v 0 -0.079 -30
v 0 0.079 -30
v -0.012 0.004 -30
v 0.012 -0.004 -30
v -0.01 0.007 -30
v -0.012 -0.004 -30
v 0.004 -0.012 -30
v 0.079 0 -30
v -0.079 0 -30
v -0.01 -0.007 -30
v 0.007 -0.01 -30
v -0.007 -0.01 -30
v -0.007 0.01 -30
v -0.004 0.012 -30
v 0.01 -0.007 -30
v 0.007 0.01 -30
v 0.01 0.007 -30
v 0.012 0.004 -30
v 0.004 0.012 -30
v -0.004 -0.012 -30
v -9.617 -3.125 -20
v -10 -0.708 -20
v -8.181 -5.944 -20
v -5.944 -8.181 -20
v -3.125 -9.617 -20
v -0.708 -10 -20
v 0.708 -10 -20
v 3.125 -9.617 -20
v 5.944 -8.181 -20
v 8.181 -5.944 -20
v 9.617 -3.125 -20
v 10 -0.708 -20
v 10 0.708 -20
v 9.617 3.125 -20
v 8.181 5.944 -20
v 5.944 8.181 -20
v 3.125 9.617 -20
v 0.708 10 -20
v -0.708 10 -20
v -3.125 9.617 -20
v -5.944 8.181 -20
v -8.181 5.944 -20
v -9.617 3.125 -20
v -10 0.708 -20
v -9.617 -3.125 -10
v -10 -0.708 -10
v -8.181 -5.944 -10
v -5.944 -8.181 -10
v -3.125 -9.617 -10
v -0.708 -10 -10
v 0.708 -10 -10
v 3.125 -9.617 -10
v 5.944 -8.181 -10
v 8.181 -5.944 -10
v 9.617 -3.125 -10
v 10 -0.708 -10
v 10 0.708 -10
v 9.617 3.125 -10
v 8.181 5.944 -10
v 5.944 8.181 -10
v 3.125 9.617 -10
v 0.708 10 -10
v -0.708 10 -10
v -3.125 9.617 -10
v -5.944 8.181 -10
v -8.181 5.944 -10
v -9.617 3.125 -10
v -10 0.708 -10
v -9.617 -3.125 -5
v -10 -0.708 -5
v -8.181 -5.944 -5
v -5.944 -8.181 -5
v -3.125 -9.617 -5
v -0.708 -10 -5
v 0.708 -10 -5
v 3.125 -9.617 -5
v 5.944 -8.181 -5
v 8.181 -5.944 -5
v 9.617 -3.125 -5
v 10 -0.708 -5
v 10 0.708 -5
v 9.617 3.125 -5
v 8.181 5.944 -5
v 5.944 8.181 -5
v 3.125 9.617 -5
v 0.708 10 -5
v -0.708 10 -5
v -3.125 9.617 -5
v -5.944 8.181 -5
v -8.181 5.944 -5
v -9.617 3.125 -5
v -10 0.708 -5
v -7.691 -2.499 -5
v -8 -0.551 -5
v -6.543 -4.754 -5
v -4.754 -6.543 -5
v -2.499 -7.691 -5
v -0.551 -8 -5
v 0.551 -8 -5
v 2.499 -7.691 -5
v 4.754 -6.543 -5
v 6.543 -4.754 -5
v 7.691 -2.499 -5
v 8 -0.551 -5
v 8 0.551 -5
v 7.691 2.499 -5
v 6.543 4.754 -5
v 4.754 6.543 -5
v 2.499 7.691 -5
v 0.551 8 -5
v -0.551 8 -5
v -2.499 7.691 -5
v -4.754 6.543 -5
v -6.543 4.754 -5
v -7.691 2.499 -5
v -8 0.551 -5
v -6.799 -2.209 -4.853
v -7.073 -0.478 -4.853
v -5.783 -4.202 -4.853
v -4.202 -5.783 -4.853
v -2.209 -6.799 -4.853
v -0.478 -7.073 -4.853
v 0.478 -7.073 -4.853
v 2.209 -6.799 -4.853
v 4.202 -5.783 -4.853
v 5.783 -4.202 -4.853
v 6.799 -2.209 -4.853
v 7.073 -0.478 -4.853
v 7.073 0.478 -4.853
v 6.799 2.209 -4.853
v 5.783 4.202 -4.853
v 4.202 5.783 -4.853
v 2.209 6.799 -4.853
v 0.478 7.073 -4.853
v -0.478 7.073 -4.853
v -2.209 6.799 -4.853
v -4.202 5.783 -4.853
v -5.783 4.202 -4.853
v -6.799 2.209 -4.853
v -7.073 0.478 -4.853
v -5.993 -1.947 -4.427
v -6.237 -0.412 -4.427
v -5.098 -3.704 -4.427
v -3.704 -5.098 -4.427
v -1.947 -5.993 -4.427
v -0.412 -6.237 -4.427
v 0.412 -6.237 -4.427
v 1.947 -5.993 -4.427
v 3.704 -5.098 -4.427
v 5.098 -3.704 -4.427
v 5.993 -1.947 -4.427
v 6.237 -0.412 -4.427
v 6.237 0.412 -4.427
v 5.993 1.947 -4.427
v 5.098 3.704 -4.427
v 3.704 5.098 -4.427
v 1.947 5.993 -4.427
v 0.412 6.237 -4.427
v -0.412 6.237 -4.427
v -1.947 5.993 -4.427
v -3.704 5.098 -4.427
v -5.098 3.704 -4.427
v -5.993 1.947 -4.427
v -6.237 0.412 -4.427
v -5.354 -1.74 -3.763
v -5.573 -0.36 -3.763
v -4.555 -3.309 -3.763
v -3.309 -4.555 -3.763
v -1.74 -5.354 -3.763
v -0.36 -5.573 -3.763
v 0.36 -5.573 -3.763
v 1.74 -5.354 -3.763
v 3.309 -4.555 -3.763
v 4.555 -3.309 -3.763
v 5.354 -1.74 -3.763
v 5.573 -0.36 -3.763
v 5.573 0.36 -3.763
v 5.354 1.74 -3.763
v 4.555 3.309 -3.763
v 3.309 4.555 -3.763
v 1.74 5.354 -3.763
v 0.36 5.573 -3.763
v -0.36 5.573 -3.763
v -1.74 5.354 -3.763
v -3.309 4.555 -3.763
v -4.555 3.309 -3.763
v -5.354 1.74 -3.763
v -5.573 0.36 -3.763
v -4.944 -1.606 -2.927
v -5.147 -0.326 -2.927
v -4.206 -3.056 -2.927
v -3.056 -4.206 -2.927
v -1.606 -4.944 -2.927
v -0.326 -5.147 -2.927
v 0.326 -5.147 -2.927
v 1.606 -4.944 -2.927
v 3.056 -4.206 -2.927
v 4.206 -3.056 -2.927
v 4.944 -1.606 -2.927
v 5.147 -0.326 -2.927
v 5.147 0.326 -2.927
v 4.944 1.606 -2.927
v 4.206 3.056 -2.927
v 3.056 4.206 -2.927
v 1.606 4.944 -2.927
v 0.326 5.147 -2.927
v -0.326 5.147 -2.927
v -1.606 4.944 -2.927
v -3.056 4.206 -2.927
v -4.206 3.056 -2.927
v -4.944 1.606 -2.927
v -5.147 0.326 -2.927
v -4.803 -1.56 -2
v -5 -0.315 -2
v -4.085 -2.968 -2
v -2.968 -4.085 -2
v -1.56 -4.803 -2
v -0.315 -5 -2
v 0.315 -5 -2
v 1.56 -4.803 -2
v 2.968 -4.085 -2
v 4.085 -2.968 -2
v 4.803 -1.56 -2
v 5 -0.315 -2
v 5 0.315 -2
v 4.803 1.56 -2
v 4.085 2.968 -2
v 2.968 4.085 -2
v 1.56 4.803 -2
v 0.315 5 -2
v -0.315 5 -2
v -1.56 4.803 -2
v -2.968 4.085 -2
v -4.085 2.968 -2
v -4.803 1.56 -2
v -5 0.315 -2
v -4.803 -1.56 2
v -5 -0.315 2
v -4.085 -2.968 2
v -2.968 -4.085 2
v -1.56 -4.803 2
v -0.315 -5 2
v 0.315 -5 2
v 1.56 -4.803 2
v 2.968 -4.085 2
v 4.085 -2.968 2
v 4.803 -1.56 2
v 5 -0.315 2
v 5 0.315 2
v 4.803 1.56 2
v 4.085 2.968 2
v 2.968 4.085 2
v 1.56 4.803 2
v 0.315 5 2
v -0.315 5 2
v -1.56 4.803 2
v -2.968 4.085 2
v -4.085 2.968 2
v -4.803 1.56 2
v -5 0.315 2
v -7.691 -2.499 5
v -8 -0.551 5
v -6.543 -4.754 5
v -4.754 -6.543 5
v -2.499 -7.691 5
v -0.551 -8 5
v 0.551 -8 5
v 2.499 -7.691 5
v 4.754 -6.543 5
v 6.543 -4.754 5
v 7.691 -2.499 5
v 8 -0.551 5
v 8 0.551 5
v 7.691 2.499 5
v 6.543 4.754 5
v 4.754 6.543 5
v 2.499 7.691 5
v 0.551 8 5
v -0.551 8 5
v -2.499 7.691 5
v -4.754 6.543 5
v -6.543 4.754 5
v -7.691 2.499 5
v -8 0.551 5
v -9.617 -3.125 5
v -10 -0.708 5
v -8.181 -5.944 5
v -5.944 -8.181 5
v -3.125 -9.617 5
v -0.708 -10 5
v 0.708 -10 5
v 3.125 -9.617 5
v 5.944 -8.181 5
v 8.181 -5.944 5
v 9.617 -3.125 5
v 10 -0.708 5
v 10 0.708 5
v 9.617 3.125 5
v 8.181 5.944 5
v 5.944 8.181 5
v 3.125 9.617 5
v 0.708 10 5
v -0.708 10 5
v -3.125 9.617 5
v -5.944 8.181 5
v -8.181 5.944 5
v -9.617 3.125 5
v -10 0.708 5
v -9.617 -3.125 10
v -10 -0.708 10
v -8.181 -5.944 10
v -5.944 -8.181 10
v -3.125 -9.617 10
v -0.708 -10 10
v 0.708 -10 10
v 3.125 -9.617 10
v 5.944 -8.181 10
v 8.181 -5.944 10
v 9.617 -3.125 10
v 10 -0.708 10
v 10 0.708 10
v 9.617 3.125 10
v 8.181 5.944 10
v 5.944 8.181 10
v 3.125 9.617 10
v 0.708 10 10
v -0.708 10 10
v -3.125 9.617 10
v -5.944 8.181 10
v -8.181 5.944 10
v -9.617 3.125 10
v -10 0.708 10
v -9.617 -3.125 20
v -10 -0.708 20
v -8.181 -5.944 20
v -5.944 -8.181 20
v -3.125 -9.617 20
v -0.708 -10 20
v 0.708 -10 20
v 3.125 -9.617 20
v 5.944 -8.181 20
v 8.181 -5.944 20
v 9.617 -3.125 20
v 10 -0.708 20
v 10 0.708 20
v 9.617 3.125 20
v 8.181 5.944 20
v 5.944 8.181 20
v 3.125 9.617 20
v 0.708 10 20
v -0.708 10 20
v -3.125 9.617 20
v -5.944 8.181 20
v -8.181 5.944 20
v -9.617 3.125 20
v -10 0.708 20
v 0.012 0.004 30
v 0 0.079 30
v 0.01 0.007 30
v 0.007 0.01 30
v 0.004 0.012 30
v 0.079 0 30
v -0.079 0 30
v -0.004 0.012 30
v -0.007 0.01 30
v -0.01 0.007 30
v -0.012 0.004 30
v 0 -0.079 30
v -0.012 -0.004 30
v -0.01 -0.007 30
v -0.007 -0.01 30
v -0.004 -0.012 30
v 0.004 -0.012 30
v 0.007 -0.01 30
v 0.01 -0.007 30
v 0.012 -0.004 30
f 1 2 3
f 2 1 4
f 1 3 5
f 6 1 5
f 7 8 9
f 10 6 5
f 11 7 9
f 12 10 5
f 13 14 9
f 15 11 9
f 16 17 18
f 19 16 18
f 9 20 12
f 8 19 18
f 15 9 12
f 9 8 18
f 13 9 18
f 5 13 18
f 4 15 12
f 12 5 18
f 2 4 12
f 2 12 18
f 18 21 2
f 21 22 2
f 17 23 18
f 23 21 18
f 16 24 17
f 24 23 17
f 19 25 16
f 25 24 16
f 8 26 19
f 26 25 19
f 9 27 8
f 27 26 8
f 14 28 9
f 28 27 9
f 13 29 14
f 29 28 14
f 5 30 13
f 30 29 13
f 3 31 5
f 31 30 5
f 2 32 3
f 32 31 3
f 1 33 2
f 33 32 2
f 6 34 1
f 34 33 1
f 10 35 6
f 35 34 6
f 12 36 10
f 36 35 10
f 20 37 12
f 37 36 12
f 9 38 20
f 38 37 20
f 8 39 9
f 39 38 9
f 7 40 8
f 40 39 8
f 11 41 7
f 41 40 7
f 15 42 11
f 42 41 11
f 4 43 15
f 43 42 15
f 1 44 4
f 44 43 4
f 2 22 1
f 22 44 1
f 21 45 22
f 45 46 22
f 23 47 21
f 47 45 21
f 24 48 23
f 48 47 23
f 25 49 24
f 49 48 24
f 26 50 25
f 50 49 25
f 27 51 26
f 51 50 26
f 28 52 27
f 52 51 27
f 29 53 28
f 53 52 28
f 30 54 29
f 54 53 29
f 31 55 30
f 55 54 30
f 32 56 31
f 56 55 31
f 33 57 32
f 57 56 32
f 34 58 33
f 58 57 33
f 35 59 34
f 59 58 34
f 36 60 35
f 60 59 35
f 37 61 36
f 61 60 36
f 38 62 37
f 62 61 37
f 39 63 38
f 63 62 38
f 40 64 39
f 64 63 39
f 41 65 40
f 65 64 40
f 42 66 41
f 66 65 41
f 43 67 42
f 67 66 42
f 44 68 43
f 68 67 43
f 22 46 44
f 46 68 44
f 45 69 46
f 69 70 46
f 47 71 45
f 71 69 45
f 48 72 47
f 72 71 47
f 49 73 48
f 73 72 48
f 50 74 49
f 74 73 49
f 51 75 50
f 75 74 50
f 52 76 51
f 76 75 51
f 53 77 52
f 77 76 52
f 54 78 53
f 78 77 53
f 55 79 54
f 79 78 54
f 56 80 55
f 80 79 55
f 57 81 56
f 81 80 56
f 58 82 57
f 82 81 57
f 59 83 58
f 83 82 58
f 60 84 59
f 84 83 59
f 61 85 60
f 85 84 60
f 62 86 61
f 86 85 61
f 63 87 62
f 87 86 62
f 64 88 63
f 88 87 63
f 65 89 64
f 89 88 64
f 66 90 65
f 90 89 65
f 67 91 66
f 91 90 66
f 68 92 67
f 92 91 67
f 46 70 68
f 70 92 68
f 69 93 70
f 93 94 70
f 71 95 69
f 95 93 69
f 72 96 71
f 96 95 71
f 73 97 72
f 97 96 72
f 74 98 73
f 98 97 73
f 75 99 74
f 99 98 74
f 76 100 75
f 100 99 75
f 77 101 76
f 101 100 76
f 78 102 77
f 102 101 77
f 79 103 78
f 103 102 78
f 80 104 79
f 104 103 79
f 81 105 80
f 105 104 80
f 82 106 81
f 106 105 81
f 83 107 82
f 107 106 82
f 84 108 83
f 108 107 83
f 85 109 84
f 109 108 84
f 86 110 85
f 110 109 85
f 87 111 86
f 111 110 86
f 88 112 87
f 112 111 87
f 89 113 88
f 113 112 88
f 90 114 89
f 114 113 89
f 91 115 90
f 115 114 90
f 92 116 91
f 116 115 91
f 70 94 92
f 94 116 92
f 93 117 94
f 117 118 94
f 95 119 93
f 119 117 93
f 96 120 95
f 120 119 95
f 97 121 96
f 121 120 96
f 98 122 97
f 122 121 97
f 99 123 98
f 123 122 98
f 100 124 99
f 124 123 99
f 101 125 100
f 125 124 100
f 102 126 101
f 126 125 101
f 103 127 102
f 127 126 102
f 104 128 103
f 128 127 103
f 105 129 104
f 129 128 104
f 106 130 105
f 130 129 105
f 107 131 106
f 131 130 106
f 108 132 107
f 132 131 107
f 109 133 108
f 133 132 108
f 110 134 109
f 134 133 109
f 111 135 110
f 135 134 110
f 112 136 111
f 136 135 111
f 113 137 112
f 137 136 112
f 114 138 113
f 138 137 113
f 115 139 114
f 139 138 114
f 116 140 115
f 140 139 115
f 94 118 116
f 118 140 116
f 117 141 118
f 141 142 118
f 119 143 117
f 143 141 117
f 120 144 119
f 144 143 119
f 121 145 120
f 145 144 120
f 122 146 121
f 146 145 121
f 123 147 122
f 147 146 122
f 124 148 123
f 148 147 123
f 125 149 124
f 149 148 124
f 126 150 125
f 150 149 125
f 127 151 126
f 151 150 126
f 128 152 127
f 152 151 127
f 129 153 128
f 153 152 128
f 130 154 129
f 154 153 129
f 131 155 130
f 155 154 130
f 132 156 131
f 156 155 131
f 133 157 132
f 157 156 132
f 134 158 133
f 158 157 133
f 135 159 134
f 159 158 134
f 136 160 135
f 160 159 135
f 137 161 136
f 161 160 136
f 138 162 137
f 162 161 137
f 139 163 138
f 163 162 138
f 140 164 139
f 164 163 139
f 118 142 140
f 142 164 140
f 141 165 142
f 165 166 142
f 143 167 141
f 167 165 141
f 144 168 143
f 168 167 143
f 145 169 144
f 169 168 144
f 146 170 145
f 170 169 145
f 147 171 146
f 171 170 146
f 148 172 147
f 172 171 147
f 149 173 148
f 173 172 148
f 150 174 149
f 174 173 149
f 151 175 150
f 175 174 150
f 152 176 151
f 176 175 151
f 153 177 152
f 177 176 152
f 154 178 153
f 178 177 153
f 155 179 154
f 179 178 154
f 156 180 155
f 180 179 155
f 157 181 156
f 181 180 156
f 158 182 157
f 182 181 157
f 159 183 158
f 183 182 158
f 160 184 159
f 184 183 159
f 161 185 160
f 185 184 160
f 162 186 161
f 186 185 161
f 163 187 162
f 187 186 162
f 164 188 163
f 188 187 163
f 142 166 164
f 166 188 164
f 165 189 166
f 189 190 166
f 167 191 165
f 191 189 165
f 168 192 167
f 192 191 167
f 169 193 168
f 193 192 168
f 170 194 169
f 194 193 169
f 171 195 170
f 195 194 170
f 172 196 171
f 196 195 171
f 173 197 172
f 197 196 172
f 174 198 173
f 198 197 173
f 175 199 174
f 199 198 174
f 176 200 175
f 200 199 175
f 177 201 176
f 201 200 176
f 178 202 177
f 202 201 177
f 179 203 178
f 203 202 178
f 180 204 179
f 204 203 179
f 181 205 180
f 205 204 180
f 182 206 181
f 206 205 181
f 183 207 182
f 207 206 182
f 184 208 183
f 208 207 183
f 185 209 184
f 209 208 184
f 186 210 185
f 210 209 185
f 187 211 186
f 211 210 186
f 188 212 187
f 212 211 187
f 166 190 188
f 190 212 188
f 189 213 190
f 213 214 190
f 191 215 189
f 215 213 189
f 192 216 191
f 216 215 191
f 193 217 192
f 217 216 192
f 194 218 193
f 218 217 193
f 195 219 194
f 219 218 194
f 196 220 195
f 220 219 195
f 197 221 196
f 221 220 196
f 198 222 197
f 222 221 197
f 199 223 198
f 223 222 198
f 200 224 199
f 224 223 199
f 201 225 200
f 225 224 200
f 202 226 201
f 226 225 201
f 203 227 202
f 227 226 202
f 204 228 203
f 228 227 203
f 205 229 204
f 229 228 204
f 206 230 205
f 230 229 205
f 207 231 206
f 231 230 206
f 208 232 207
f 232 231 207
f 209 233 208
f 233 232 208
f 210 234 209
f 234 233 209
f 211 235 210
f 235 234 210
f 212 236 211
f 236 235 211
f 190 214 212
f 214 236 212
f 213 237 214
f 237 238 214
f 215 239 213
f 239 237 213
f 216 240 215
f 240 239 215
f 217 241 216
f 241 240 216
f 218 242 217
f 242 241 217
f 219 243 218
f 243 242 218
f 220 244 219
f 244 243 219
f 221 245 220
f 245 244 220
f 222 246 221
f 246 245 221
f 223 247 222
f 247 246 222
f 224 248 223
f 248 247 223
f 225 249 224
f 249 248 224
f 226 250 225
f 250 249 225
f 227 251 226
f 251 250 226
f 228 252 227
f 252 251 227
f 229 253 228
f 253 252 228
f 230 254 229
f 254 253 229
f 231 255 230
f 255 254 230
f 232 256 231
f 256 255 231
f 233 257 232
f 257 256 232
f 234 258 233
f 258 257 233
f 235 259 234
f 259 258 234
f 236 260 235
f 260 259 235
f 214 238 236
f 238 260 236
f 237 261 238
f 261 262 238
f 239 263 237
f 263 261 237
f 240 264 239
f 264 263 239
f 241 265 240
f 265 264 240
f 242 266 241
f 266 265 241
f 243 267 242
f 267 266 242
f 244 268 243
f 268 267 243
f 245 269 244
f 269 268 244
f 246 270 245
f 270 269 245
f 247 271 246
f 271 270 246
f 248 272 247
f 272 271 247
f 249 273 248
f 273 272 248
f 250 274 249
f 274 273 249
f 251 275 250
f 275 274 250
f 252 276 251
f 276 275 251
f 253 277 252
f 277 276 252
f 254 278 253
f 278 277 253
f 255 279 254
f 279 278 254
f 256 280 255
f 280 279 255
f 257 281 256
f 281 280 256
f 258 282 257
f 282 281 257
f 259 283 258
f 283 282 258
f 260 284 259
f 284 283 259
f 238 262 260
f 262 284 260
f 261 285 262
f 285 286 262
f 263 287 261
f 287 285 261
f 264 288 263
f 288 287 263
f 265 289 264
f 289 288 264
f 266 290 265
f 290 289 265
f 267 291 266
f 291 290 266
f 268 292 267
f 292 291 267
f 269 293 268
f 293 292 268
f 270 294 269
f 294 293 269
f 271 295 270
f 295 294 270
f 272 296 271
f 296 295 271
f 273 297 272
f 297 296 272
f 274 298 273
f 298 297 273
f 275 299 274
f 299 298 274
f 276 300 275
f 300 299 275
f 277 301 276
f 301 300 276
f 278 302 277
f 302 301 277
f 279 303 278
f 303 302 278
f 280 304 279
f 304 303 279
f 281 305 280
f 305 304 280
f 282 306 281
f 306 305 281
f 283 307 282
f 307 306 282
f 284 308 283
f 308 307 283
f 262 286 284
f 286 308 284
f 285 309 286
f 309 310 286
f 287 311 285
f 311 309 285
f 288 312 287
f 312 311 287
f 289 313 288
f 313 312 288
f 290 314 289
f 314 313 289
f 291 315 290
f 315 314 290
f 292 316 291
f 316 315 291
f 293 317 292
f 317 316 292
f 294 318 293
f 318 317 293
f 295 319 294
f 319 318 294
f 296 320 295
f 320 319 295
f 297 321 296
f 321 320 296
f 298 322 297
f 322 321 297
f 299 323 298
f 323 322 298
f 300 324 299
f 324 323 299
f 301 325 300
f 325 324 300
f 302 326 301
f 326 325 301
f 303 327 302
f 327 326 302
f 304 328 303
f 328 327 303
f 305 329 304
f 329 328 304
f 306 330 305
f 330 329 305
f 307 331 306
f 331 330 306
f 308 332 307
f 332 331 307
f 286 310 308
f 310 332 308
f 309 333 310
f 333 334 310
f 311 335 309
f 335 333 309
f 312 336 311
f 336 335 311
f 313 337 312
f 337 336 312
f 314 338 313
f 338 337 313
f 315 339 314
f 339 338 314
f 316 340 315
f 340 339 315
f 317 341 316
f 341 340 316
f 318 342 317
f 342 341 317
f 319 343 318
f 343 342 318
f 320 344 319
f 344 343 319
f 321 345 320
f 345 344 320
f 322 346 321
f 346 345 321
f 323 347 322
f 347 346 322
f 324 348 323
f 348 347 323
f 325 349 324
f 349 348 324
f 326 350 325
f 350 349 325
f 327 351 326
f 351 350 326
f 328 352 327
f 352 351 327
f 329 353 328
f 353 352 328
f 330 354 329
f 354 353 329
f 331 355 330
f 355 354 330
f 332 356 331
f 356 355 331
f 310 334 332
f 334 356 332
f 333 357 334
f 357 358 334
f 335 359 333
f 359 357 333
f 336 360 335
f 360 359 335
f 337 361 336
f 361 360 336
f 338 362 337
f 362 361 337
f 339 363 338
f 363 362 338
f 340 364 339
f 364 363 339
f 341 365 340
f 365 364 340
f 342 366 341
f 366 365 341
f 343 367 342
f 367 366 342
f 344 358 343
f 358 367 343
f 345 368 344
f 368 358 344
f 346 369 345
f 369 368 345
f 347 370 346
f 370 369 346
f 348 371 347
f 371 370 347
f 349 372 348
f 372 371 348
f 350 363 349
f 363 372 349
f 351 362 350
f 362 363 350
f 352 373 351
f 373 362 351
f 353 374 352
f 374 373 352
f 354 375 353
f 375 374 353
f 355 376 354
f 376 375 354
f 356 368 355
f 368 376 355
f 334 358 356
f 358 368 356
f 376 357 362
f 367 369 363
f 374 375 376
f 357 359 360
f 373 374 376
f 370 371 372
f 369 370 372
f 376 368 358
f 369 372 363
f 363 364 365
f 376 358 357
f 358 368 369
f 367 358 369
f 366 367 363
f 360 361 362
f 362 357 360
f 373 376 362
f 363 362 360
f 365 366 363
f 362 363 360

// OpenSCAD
// file: ../lib/TOGComplexLib1.scad
function tcplx1_multiply(a, b) =
	[a[0]*b[0] - a[1]*b[1], a[0]*b[1] + a[1]*b[0]];
function tcplx1_divide(a, b) =
	let(bot = (b[0]*b[0] + b[1]*b[1]))
	[
		(a[0]*b[0] + a[1]*b[1])/bot,
		(a[1]*b[0] - a[0]*b[1])/bot
	];

assert([-11,23] == tcplx1_multiply([3,2], [1,7]));

assert([-1,3] == tcplx1_multiply([3,1], [0,1]));
assert([-1,3] == tcplx1_multiply([0,1], [3,1]));

echo(tcplx1_divide([-1,3], [3,1]));
assert([0,1] == tcplx1_divide([-1,3], [3,1]));

function tcplx1_normalize(vec) =
	let(veclen = sqrt(vec[0]*vec[0]+vec[1]*vec[1]))
	[vec[0] / veclen, vec[1] / veclen];

function tcplx1_relative_turnvec_vv(v0, v1) =
	tcplx1_divide(tcplx1_normalize(v1), tcplx1_normalize(v0));

function tcplx1_relative_turnvec_abc(p0, p1, p2) = tcplx1_relative_turnvec_vv(p1-p0, p2-p1);

// A 90-degree turn
assert([0,1] == tcplx1_relative_turnvec_abc([0,0], [1,0], [1,1]));
assert([0,1] == tcplx1_relative_turnvec_abc([0,0], [0,1], [-1,1]));

// A 45-degree turn
assert(tcplx1_normalize([1,1]) == tcplx1_relative_turnvec_abc([0,0], [1,0], [ 2,1]));
assert(tcplx1_normalize([1,1]) == tcplx1_relative_turnvec_abc([0,0], [0,1], [-1,2]));


function tcplx1_relative_angle_abc(p0, p1, p2) =
	let(turnvec = tcplx1_relative_turnvec_abc(p0, p1, p2))
	atan2(turnvec[1], turnvec[0]);

assert(-135 == tcplx1_relative_angle_abc([0,0], [1,0], [0,-1]));
assert( -90 == tcplx1_relative_angle_abc([0,0], [1,0], [1,-1]));
assert(   0 == tcplx1_relative_angle_abc([0,0], [1,0], [2, 0]));
assert(  90 == tcplx1_relative_angle_abc([0,0], [1,0], [1, 1]));
assert( 135 == tcplx1_relative_angle_abc([0,0], [1,0], [0, 1]));

assert(  90 == tcplx1_relative_angle_abc([1,1], [3,3], [1, 5]));
// file: ../lib/TOGArrayLib1.scad
// TOGArrayLib1.5
// 
// Functions for working with arrays.
// 
// v1.1:
// - tal1_reduce assert(is_list(items)) to prevent infinite recursion
//   when given undefined or other non-list values
// v1.1.1:
// - Fix tal1_uniq_remap_v2 to return "list-remap-result" as the
//   first element of the returned list
// v1.2:
// - Add tal1_replace_at function
// v1.3:
// - tal1_is_vec_of, tal1_is_vec_of_num
// v1.4:
// - tal1_assert_for_each, for when you want to assert something
//   about each of a list of items and get nice failure messages
// v1.5:
// - Add tal1_duplicate_reversed function, which may be
//   handy when generating symmetrical polygons and stuff.

/**
 * Make a list with the contents of list `a`,
 * but starting at offset `off`, replaced by the contents of list `b`.
 * len(result) = max(len(a), off+len(b))
 */
function tal1_replace_at(a, off, b, default_value=undef, default_value_function=undef) =
	assert(is_list(a))
	assert(is_list(b))
	let( _dvf = !is_undef(default_value_function) ? default_value_function : function(i) default_value )
[
	for( i=[0:1:min(off,len(a))-1] ) a[i],
	for( i=[len(a):1:off-1] ) _dvf(i),
	for( i=[off:1:off+len(b)-1] ) b[i-off],
	for( i=[off+len(b):1:len(a)-1] ) a[i],
];

// Simplest case
assert([] == tal1_replace_at([], 0, []));
// Second simplest cases
assert(["foo"] == tal1_replace_at(["foo"], 0, []));
assert(["foo"] == tal1_replace_at([], 0, ["foo"]));
// Replace one item
assert(["foo","quux","baz"] == tal1_replace_at(["foo","bar","baz"], 1, ["quux"]));
// Replace and extend
assert(["foo","quux","tuna","tina"] == tal1_replace_at(["foo","bar","baz"], 1, ["quux", "tuna", "tina"]));
// Add beyond end of `a`
assert(["foo","zzz","quux"] == tal1_replace_at(["foo"], 2, ["quux"], default_value="zzz"));
// Adding 'nothing' should still fill to that point with defaults
assert(["foo","zzz","zzz"] == tal1_replace_at(["foo"], 3, [], default_value="zzz"));


function tal1_reduce(start, items, func, offset=0) =
	assert(is_list(items))
	len(items) == offset ? start :
	tal1_reduce(func(start, items[offset]), items, func, offset+1);

function tal1_consecutive_duplicate_count(items) = tal1_reduce(
	[0, undef],
	items,
	function(z,item) [z[0] + (item == z[1] ? 1 : 0), item]
)[0];

assert(0 == tal1_consecutive_duplicate_count([]));
assert(0 == tal1_consecutive_duplicate_count([50]));
assert(1 == tal1_consecutive_duplicate_count([50,50]));
assert(0 == tal1_consecutive_duplicate_count([50,51,52,53]));
assert(1 == tal1_consecutive_duplicate_count([50,51,52,52]));
assert(3 == tal1_consecutive_duplicate_count([50,50,50,50]));

// Set test_size to arbirarily large values
// to ensure that OpenSCAD can handle heavy recursion
let(test_size=1000) assert(test_size/2 == tal1_consecutive_duplicate_count([for(i=[0:1:test_size-1]) floor(i/2)]));



function tal1_uniq_(items, off0, off1) =
	let(chunklen = off1-off0)
	chunklen == 0 ? [] :
	chunklen == 1 ? [items[off0]] :
	let(half=floor(chunklen/2))
	let(left  = tal1_uniq_(items, off0     , off0+half))
	let(right = tal1_uniq_(items, off0+half, off1     ))
	assert(len(left) > 0)
	assert(len(right) > 0)
	left[len(left)-1] == right[0] ? [each left, for(i=[1:1:len(right)-1]) right[i]] :
	[each left, each right];

/** Given a list of items, returns a new list with identical consecutive items merged */
function tal1_uniq(items) = tal1_uniq_(items, 0, len(items));

assert([] == tal1_uniq([]));
assert([123] == tal1_uniq([123]));
assert([55,0,1,2,3] == tal1_uniq([55,0,1,2,3]));
assert([55,0,1,2] == tal1_uniq([55,0,1,1,2]));
assert([55,0,1] == tal1_uniq([55,55,0,0,0,0,0,0,1,1,1,1]));
assert([55,0] == tal1_uniq([55,0,0,0,0,0,0,0]));



/**
 * Returns [new items, old index -> new index mapping].
 * No-op version.
 */
function tal1_uniq_remap_v1(items) =
	["list-remap-result", items, [for (vi=[0:1:len(items)-1]) vi]];

// [a, a, b, b, c, c]
//
// [a,    ...], []  -> [a],[0]
// [a, a, ...], [0] -> [a],[0,0]

assert([1,2,3] == [1,2,3]);

/**
 * Recursive version that will combine adjacent identical vertexes,
 * but will use the original items.
 */
function tal1_uniq_remap_v2(items, map=[]) =
	let(index = len(map))
	len(items) == index ? ["list-remap-result", items, map] :
	index == 0 ? tal1_uniq_remap_v2(items, [0]) :
	items[index] == items[map[index-1]] ? tal1_uniq_remap_v2(items, [for(vi=map) vi, map[index-1]]) :
	tal1_uniq_remap_v2(items, [for(vi=map) vi, index]);

assert(tal1_uniq_remap_v2([1,1,2,2,3,4]) == ["list-remap-result", [1,1,2,2,3,4], [0,0,2,2,4,5]]);


/**
 * Returns true if `vec` is a list of at least min_len items
 * and component_check(each item, even those beyond min_len) is true.
 */
function tal1_is_vec_of(vec, min_len=0, component_check=function(x) true) =
	assert(is_num(min_len) && min_len >= 0)
	assert(is_function(component_check))
	is_list(vec) && len(vec) >= min_len &&
	tal1_reduce(true, vec, function(prev,item) prev && component_check(item));

function tal1_is_vec_of_num(vec, min_len=0) = tal1_is_vec_of(vec, min_len, function(i) is_num(i));

assert( true == tal1_is_vec_of_num([1,2,3]));
assert( true == tal1_is_vec_of_num([]));
assert( true == tal1_is_vec_of_num([1,2,3], 3));
assert(false == tal1_is_vec_of_num([1,2], 3));
assert(false == tal1_is_vec_of_num([1,2,"spoon"], 3));
// Requirements are ambiguous when
// first min_len items are numbers, but there are non-numeric items afterwards,
// so let's error on the side of saying 'no, it's not a list of numbers';
// i.e. the item check and the min_len are independent.
assert(false == tal1_is_vec_of_num([1,2,3,"artichoke"], 3));


/**
 * Asserts that item_checker(each item in list, index of item)[0] is true.
 * Second element of item_checker return value is assertion message.
 * Returns the original list, in case that's useful to you.
 */
function tal1_assert_for_each(list, item_checker) =
	let( _ignored = [ for(i=[0:1:len(list)-1])
		let(q=item_checker(list[i],i))
		let(passed=is_bool(q) ? q : is_list(q) ? q[0] : assert(false, str(
			"tal1_assert_for_each: item_checker should return Bool|[Bool,String], but returned ",
			q, " for item at index ", i)))
		let(message=is_list(q) ? q[1] : undef)
		assert(passed, message)
		q
	])
	list;

// Callback can return a boolean...
assert([1,2,3] == tal1_assert_for_each([1,2,3], function(v,i) is_num(v)));
// ...or a [boolean, string]
assert([1,2,3] == tal1_assert_for_each([1,2,3], function(v,i) [is_num(v), "element be a num"]));

// [a, b, c] -> [a, b, c, rxf(c), rxf(b), rxf(a)]
function tal1_duplicate_reversed(list, rxf=function(item) item) =
	[
		each list,
		for( i=[len(list)-1 : -1 : 0] ) rxf(list[i]),
	];
// file: ../lib/TOGVecLib0.scad
// Note: TOGMod1Constructors's togmod1__make_nd_vector_adder is used for similar purpose.

function togvec0_extend(vec, length, filler=0) = [
	for( i=[0 : 1 : length-1] ) len(vec) <= i ? filler : vec[i]
];

function togvec0_add_vec(a, b) =
	let( newlen = max(len(a), len(b)) )
	togvec0_extend(a, newlen) + togvec0_extend(b, newlen);

function togvec0_offset_points(points, offset, numtovec=function(n) [0,0,n] ) =
	let( offset_vec =
		is_list(offset) ? offset :
		is_num(offset) ? numtovec(offset) :
		assert(false, str("togvec0_offset_points: `offset` must be a List<Number> or Number; got: ", offset)) )
	[for(p=points) togvec0_add_vec(p, offset_vec)];
// file: ../lib/TOGMod1Constructors.scad
// TOGMod1Constructors-v1.11
// 
// Functions to construct objects understood by TOGMod1
// 
// v1.1:
// - Add togmod1_make_rounded_rect
// v1.2:
// - togmod1_make_rounded_rect can make ovals
// v1.3:
// - togmod1_circle_points, to just get the points of a circle
// - if pos parameter to circle function has a third element,
//   returned vertexes will include it as the z component;
// v1.3.1
// - Some assertions
// v1.4:
// - Refactor togmod1_rounded_rect_points and togmod1_circle_points
//   to use togmod1__make_nd_vector_adder for adapting to whatever
//   `pos` parameter is.
// v1.5:
// - togmod_rounded_rect_points will not simplify completely rounded sides
//   (where length of side is exactly twice the rounding radius)
//   unless simplify_rounded_sides=true
//   - This makes it more useful for polyhedron generation,
//     where radius varies, but number of points must remain constant.
// v1.6:
// - togmod1_make_rect makes a simple rectangle
// - togmod1_make_rounded_rect will defer to togmod1_make_rect when r=0
// v1.7:
// - togmod1_make_circle will return empty shape (["union"]) when d=0
// v1.8:
// - Add togmod1_text
// v1.9:
// - togmod1_circle_points uses 3 as minimum circle point count instead of 6
// v1.10:
// - Fix togmod1_linear_extrude_y so that range corresponds to Y start/end and
//   polygon X,Y correspond to X,Z.  Previously it was rotated wrongly,
//   which would have gone unnoticed for symmetrical shapes centered at 0,0.
// v1.11:
// - Remove an 'echo'

use <./TOGArrayLib1.scad>

function togmod1__make_nd_vector_adder(origin=[0,0]) =
	let(origin_is_zero = tal1_reduce(true, origin, function(prev,item) prev && item == 0))
	origin_is_zero ? (function(vec) len(vec) >= len(origin) ? vec : tal1_replace_at(origin, 0, vec)) :
	function(vec) [
		for(i=[0:1:max(len(origin),len(vec))-1]) (len(vec) > i ? vec[i] : 0) + (len(origin) > i ? origin[i] : 0),
	];

assert([1,2,3] == togmod1__make_nd_vector_adder()([1,2,3]));
assert([1,2,3] == togmod1__make_nd_vector_adder([0,0,3])([1,2]));


function togmod1_make_cuboid(size) =
	assert(is_list(size))
	assert(len(size) >= 3)
	assert(is_num(size[0]))
	assert(is_num(size[1]))
	assert(is_num(size[2]))
	["polyhedron-vf", [
		[-size[0]/2, -size[1]/2, -size[2]/2],
		[+size[0]/2, -size[1]/2, -size[2]/2],
		[-size[0]/2, +size[1]/2, -size[2]/2],
		[+size[0]/2, +size[1]/2, -size[2]/2],
		[-size[0]/2, -size[1]/2, +size[2]/2],
		[+size[0]/2, -size[1]/2, +size[2]/2],
		[-size[0]/2, +size[1]/2, +size[2]/2],
		[+size[0]/2, +size[1]/2, +size[2]/2]
	], [
		[0,1,3,2],[0,4,5,1],[4,6,7,5],[3,7,6,2],[1,5,7,3],[6,4,0,2]
	]];

function togmod1_make_polygon(verts) =
	["polygon-vp", verts, [[for( i=[0:1:len(verts)-1] ) i%len(verts)]]];

function togmod1_rounded_rect_points(size, r, pos=[0,0], simplify_rounded_sides=false) =
	assert(is_list(size))
	assert(len(size) >= 2)
	let(radii = is_list(r) ? r : is_num(r) ? [r,r] : assert(false, "rounded_rect r(adius) should be list<num> or num"))
	let(rx = radii[0])
	let(ry = radii[1])
	assert(is_num(rx))
	assert(is_num(ry))
	assert(size[0] >= 2*rx, str("size[0] must be >= 2*r[0]; size[0] = ",size[0],", 2*r[0] = ",2*rx))
	assert(size[1] >= 2*ry, str("size[1] must be >= 2*r[1]; size[1] = ",size[1],", 2*r[1] = ",2*ry))
	let(quarterfn=max($fn/4, 1))
	let(qfnx = simplify_rounded_sides && size[0] == 2*rx ? quarterfn-1 : quarterfn)
	let(qfny = simplify_rounded_sides && size[1] == 2*ry ? quarterfn-1 : quarterfn)
	let(finalizepos = togmod1__make_nd_vector_adder(pos))
[
	for(a=[0 : 1 : qfnx]) let(ang=      a*90/quarterfn) finalizepos([ size[0]/2-rx + rx*cos(ang),  size[1]/2-ry + ry*sin(ang)]),
	for(a=[0 : 1 : qfny]) let(ang= 90 + a*90/quarterfn) finalizepos([-size[0]/2+rx + rx*cos(ang),  size[1]/2-ry + ry*sin(ang)]),
	for(a=[0 : 1 : qfnx]) let(ang=180 + a*90/quarterfn) finalizepos([-size[0]/2+rx + rx*cos(ang), -size[1]/2+ry + ry*sin(ang)]),
	for(a=[0 : 1 : qfny]) let(ang=270 + a*90/quarterfn) finalizepos([ size[0]/2-rx + rx*cos(ang), -size[1]/2+ry + ry*sin(ang)]),
];

function togmod1_make_rect(size) =
	togmod1_make_polygon([
		[-size[0]/2, -size[1]/2],
		[+size[0]/2, -size[1]/2],
		[+size[0]/2, +size[1]/2],
		[-size[0]/2, +size[1]/2],
	]);

function togmod1_make_rounded_rect(size, r) =
	r == 0 ? togmod1_make_rect(size) :
	togmod1_make_polygon(togmod1_rounded_rect_points(size,r,simplify_rounded_sides=true));

/**
 * Returns points for an approximation of a circle where points are at distance r from pos.
 * Can be used to make other regular polygons, but the faces will be less than that
 * distance from pos (do some trig if you want face distance, e.g. for a hex nut).
 */
function togmod1_circle_points(r, pos=[0,0], d=undef) =
	assert( !is_undef(r) || !is_undef(d) )
	assert(!is_undef(pos[0]))
	assert(!is_undef(pos[1]))
	let(finalizepos = togmod1__make_nd_vector_adder(pos))
	let(r_ = !is_undef(r) ? r : d/2)
	let(fn = max($fn, 3))
	[for(i=[0 : 1 : fn-1]) finalizepos([r_*cos(i*360/fn), r_*sin(i*360/fn)])];

function togmod1_make_circle(r, pos=[0,0], d=undef) =
	r == 0 || d == 0 ? ["union"] :
	togmod1_make_polygon(togmod1_circle_points(r=r, pos=pos, d=d));

function togmod1_make_cylinder(d, zrange=[0,1], r=undef, pos=[0,0]) =
	assert( !is_undef(r) || !is_undef(d) )
	let( r_ = !is_undef(r) ? r : d/2 )
	// TODO: Make polyhedron directly
	["linear-extrude-zs", zrange, togmod1_make_circle(r=r_, pos=pos)];

function togmod1__is_range1d(range) = is_list(range) && len(range) == 2 && is_num(range[0]) && is_num(range[1]);

function togmod1_linear_extrude_z(range, shape) =
	assert(togmod1__is_range1d(range))
	["linear-extrude-zs", range, shape];
function togmod1_linear_extrude_x(range, shape) =
	assert(togmod1__is_range1d(range))
	["rotate", [90, 0, 90], togmod1_linear_extrude_z(range, shape)];
function togmod1_linear_extrude_y(range, shape) =
	assert(togmod1__is_range1d(range))
	["rotate", [90, 0,  0], togmod1_linear_extrude_z([-range[1], -range[0]], shape)];

function togmod1_text(text, size, font, halign, valign, spacing, direction, language, script) =
	["text-tsfhvsdls", text, size, font, halign, valign, spacing, direction, language, script];
// file: ../lib/TOGMod1.scad
// TOGMod1.9
// OpenSCAD library for representing shapes
// 
// See also: Functional OpenSCAD (https://github.com/thehans/FunctionalOpenSCAD)
// 
// v1.8:
// - Add `text-tsfhvsdls`
// v1.9
// - Add `offset-ds` (offset with _d_elta a _s_hape)

module togmod1_domodule(mod) {
	assert(is_list(mod));
	assert(len(mod) > 0);
	if( mod[0] == "polygon-vp" ) {
		// ["polygon-vp", vertexes, paths]
		polygon(points=mod[1], paths=mod[2]);
	} else if( mod[0] == "polyhedron-vf" ) {
		polyhedron(mod[1], faces=mod[2]);
	} else if( mod[0] == "scale" ) {
		assert(len(mod) == 3);
		scale(mod[1]) togmod1_domodule(mod[2]);
	} else if( mod[0] == "translate" ) {
		assert(len(mod) == 3);
		assert(is_list(mod[1]));
		for(c=mod[1]) assert(is_num(c), "translate component should be numeric");
		translate(mod[1]) togmod1_domodule(mod[2]);
	} else if( mod[0] == "rotate" ) {
		assert(len(mod) == 3);
		rotate(mod[1]) togmod1_domodule(mod[2]);
	} else if( mod[0] == "intersection" ) {
		intersection_for( i=[1:1:len(mod)-1] ) togmod1_domodule(mod[i]);
	} else if( mod[0] == "difference" ) {
		difference() {
			togmod1_domodule(mod[1]);
			for( i=[2:1:len(mod)-1] ) togmod1_domodule(mod[i]);
		}
	} else if( mod[0] == "union" ) {
		for( i=[1:1:len(mod)-1] ) togmod1_domodule(mod[i]);
	} else if( mod[0] == "hull" ) {
		hull() for( i=[1:1:len(mod)-1] ) togmod1_domodule(mod[i]);
	} else if( mod[0] == "offset-rs" ) {
		assert(len(mod) == 3);
		assert(is_num(mod[1]));
		assert(is_list(mod[2]));
		offset(mod[1]) togmod1_domodule(mod[2]);
	} else if( mod[0] == "linear-extrude-zs" ) {
		// ["linear-extrude-zs", [z0,z1], 2d_shape] // centered
		// ["linear-extrude-zs", height, 2d_shape]
		let( zrange = is_list(mod[1]) ? mod[1] : [-mod[1]/2, mod[1]/2] ) {
			translate([0,0,zrange[0]]) linear_extrude(zrange[1]-zrange[0]) togmod1_domodule(mod[2]);
		}
	} else if( mod[0] == "render" ) {
		render() togmod1_domodule(mod[1]);
	} else if( mod[0] == "minkowski" ) {
		minkowski() {
			togmod1_domodule(mod[1]);
			togmod1_domodule(mod[2]);
		}
	} else if( mod[0] == "x-debug" ) {
		# togmod1_domodule(mod[1]);
	} else if( mod[0] == "x-color" ) {
		color(mod[1]) togmod1_domodule(mod[2]);
	} else if( mod[0] == "text-tsfhvsdls" ) {
		text(text=mod[1], size=mod[2], font=mod[3], halign=mod[4], valign=mod[5], spacing=mod[6], direction=mod[7], language=mod[7], script=mod[8]);
	} else if( mod[0] == "offset-ds" ) {
		assert(is_num(mod[1]));
		assert(is_list(mod[2]));
		offset(delta=mod[1]) togmod1_domodule(mod[2]);
	} else {
		assert(false, str("Unrecognized shape: ", mod[0]));
	}
}
// main file
// Flangify0
// 
// Attempt at more convenient
// representation of holes
// with counterbores, bevels, flanges, etc.
// 
// Maybe should just be a special mode of tphl1_make_z_cylinder
// 
// pointdat = ["zdopses", ["zdops", [z, d], op, ...], ...], similar to a rath
// op = ["round", radius], same as togpath1-rathnode's

use <../lib/TOGMod1.scad>
use <../lib/TOGMod1Constructors.scad>
use <../lib/TOGPath1.scad>
use <../lib/TOGPolyhedronLib1.scad>
use <../lib/TOGVecLib0.scad>

function flangify0_extrude_rath(zrs, rath, r0=0) =
	tphl1_make_polyhedron_from_layer_function(zrs, function(zr)
		let( offset_rath = togpath1_offset_rath(rath, zr[1]-r0) )
		togvec0_offset_points(togpath1_rath_to_polypoints(offset_rath), zr[0])
	);

function flangify0_extrude_z(zrs, shape="point", r0=0) =
	shape == "point" ? flangify0_extrude_rath(zrs, togpath1_make_circle_rath(1), r0+1) :
	is_list(shape) && shape[0] == "togpath1-rath" ? flangify0_extrude_rath(zrs, shape, r0) :
	// TODO: Support polylines?
	assert(false, str("Unsupported shape: ", shape));

$fn = 24;

function flangify0__spec_to_zrs1(zropses, idx=1, rfac=1) =
	let(rath = ["togpath1-rath",
		for(p=[idx:1:len(zropses)-1])
			let(zrops=zropses[p])
				let(zd=zrops[1])
					["togpath1-rathnode", [zd[0], zd[1]*rfac], for(o=[2:1:len(zrops)-1]) zrops[o]]
	])
	togpath1_rath_to_polypoints(rath);

function flangify0_extend(extra_depth, extra_height, spec) =
let(last = len(spec)-1)
let(rfac = spec[0] == "zdopses" ? 0.5 : 1)
let(zd0 = spec[1   ][1])
let(zdN = spec[last][1])
[spec[0],
	if( extra_depth > 0 ) each [
		["zdops", [zd0[0] - extra_depth - zd0[1]*rfac, 0    ]],
		["zdops", [zd0[0] - extra_depth              , zd0[1]]],
	],
	for( i=[1:1:len(spec)-1] ) spec[i],
	if( extra_height > 0 ) each [
		["zdops", [zdN[0] + extra_depth              , zdN[1]]],
		["zdops", [zdN[0] + extra_depth + zdN[1]*rfac, 0    ]]
	],
];

function flangify0_spec_to_zrs(spec) =
	spec[0] == "zdopses" ? flangify0__spec_to_zrs1(spec, 1, 0.5) :
	spec[0] == "zropses" ? flangify0__spec_to_zrs1(spec, 1, 1) :
	assert(false, str("Unrecognized shape spec: '", spec[0], "'"));

// togmod1_domodule(zrs_to_cylinder([[0,5],[10,5]]));
togmod1_domodule(flangify0_extrude_z(flangify0_spec_to_zrs(flangify0_extend(10, 10, ["zdopses",
	["zdops", [-10,20]],
	["zdops", [- 5,20]],
	["zdops", [- 5,10], ["round", 3]],
	["zdops", [  5,10], ["bevel", 3]],
	["zdops", [  5,20]],
	["zdops", [ 10,20]],
]))));
